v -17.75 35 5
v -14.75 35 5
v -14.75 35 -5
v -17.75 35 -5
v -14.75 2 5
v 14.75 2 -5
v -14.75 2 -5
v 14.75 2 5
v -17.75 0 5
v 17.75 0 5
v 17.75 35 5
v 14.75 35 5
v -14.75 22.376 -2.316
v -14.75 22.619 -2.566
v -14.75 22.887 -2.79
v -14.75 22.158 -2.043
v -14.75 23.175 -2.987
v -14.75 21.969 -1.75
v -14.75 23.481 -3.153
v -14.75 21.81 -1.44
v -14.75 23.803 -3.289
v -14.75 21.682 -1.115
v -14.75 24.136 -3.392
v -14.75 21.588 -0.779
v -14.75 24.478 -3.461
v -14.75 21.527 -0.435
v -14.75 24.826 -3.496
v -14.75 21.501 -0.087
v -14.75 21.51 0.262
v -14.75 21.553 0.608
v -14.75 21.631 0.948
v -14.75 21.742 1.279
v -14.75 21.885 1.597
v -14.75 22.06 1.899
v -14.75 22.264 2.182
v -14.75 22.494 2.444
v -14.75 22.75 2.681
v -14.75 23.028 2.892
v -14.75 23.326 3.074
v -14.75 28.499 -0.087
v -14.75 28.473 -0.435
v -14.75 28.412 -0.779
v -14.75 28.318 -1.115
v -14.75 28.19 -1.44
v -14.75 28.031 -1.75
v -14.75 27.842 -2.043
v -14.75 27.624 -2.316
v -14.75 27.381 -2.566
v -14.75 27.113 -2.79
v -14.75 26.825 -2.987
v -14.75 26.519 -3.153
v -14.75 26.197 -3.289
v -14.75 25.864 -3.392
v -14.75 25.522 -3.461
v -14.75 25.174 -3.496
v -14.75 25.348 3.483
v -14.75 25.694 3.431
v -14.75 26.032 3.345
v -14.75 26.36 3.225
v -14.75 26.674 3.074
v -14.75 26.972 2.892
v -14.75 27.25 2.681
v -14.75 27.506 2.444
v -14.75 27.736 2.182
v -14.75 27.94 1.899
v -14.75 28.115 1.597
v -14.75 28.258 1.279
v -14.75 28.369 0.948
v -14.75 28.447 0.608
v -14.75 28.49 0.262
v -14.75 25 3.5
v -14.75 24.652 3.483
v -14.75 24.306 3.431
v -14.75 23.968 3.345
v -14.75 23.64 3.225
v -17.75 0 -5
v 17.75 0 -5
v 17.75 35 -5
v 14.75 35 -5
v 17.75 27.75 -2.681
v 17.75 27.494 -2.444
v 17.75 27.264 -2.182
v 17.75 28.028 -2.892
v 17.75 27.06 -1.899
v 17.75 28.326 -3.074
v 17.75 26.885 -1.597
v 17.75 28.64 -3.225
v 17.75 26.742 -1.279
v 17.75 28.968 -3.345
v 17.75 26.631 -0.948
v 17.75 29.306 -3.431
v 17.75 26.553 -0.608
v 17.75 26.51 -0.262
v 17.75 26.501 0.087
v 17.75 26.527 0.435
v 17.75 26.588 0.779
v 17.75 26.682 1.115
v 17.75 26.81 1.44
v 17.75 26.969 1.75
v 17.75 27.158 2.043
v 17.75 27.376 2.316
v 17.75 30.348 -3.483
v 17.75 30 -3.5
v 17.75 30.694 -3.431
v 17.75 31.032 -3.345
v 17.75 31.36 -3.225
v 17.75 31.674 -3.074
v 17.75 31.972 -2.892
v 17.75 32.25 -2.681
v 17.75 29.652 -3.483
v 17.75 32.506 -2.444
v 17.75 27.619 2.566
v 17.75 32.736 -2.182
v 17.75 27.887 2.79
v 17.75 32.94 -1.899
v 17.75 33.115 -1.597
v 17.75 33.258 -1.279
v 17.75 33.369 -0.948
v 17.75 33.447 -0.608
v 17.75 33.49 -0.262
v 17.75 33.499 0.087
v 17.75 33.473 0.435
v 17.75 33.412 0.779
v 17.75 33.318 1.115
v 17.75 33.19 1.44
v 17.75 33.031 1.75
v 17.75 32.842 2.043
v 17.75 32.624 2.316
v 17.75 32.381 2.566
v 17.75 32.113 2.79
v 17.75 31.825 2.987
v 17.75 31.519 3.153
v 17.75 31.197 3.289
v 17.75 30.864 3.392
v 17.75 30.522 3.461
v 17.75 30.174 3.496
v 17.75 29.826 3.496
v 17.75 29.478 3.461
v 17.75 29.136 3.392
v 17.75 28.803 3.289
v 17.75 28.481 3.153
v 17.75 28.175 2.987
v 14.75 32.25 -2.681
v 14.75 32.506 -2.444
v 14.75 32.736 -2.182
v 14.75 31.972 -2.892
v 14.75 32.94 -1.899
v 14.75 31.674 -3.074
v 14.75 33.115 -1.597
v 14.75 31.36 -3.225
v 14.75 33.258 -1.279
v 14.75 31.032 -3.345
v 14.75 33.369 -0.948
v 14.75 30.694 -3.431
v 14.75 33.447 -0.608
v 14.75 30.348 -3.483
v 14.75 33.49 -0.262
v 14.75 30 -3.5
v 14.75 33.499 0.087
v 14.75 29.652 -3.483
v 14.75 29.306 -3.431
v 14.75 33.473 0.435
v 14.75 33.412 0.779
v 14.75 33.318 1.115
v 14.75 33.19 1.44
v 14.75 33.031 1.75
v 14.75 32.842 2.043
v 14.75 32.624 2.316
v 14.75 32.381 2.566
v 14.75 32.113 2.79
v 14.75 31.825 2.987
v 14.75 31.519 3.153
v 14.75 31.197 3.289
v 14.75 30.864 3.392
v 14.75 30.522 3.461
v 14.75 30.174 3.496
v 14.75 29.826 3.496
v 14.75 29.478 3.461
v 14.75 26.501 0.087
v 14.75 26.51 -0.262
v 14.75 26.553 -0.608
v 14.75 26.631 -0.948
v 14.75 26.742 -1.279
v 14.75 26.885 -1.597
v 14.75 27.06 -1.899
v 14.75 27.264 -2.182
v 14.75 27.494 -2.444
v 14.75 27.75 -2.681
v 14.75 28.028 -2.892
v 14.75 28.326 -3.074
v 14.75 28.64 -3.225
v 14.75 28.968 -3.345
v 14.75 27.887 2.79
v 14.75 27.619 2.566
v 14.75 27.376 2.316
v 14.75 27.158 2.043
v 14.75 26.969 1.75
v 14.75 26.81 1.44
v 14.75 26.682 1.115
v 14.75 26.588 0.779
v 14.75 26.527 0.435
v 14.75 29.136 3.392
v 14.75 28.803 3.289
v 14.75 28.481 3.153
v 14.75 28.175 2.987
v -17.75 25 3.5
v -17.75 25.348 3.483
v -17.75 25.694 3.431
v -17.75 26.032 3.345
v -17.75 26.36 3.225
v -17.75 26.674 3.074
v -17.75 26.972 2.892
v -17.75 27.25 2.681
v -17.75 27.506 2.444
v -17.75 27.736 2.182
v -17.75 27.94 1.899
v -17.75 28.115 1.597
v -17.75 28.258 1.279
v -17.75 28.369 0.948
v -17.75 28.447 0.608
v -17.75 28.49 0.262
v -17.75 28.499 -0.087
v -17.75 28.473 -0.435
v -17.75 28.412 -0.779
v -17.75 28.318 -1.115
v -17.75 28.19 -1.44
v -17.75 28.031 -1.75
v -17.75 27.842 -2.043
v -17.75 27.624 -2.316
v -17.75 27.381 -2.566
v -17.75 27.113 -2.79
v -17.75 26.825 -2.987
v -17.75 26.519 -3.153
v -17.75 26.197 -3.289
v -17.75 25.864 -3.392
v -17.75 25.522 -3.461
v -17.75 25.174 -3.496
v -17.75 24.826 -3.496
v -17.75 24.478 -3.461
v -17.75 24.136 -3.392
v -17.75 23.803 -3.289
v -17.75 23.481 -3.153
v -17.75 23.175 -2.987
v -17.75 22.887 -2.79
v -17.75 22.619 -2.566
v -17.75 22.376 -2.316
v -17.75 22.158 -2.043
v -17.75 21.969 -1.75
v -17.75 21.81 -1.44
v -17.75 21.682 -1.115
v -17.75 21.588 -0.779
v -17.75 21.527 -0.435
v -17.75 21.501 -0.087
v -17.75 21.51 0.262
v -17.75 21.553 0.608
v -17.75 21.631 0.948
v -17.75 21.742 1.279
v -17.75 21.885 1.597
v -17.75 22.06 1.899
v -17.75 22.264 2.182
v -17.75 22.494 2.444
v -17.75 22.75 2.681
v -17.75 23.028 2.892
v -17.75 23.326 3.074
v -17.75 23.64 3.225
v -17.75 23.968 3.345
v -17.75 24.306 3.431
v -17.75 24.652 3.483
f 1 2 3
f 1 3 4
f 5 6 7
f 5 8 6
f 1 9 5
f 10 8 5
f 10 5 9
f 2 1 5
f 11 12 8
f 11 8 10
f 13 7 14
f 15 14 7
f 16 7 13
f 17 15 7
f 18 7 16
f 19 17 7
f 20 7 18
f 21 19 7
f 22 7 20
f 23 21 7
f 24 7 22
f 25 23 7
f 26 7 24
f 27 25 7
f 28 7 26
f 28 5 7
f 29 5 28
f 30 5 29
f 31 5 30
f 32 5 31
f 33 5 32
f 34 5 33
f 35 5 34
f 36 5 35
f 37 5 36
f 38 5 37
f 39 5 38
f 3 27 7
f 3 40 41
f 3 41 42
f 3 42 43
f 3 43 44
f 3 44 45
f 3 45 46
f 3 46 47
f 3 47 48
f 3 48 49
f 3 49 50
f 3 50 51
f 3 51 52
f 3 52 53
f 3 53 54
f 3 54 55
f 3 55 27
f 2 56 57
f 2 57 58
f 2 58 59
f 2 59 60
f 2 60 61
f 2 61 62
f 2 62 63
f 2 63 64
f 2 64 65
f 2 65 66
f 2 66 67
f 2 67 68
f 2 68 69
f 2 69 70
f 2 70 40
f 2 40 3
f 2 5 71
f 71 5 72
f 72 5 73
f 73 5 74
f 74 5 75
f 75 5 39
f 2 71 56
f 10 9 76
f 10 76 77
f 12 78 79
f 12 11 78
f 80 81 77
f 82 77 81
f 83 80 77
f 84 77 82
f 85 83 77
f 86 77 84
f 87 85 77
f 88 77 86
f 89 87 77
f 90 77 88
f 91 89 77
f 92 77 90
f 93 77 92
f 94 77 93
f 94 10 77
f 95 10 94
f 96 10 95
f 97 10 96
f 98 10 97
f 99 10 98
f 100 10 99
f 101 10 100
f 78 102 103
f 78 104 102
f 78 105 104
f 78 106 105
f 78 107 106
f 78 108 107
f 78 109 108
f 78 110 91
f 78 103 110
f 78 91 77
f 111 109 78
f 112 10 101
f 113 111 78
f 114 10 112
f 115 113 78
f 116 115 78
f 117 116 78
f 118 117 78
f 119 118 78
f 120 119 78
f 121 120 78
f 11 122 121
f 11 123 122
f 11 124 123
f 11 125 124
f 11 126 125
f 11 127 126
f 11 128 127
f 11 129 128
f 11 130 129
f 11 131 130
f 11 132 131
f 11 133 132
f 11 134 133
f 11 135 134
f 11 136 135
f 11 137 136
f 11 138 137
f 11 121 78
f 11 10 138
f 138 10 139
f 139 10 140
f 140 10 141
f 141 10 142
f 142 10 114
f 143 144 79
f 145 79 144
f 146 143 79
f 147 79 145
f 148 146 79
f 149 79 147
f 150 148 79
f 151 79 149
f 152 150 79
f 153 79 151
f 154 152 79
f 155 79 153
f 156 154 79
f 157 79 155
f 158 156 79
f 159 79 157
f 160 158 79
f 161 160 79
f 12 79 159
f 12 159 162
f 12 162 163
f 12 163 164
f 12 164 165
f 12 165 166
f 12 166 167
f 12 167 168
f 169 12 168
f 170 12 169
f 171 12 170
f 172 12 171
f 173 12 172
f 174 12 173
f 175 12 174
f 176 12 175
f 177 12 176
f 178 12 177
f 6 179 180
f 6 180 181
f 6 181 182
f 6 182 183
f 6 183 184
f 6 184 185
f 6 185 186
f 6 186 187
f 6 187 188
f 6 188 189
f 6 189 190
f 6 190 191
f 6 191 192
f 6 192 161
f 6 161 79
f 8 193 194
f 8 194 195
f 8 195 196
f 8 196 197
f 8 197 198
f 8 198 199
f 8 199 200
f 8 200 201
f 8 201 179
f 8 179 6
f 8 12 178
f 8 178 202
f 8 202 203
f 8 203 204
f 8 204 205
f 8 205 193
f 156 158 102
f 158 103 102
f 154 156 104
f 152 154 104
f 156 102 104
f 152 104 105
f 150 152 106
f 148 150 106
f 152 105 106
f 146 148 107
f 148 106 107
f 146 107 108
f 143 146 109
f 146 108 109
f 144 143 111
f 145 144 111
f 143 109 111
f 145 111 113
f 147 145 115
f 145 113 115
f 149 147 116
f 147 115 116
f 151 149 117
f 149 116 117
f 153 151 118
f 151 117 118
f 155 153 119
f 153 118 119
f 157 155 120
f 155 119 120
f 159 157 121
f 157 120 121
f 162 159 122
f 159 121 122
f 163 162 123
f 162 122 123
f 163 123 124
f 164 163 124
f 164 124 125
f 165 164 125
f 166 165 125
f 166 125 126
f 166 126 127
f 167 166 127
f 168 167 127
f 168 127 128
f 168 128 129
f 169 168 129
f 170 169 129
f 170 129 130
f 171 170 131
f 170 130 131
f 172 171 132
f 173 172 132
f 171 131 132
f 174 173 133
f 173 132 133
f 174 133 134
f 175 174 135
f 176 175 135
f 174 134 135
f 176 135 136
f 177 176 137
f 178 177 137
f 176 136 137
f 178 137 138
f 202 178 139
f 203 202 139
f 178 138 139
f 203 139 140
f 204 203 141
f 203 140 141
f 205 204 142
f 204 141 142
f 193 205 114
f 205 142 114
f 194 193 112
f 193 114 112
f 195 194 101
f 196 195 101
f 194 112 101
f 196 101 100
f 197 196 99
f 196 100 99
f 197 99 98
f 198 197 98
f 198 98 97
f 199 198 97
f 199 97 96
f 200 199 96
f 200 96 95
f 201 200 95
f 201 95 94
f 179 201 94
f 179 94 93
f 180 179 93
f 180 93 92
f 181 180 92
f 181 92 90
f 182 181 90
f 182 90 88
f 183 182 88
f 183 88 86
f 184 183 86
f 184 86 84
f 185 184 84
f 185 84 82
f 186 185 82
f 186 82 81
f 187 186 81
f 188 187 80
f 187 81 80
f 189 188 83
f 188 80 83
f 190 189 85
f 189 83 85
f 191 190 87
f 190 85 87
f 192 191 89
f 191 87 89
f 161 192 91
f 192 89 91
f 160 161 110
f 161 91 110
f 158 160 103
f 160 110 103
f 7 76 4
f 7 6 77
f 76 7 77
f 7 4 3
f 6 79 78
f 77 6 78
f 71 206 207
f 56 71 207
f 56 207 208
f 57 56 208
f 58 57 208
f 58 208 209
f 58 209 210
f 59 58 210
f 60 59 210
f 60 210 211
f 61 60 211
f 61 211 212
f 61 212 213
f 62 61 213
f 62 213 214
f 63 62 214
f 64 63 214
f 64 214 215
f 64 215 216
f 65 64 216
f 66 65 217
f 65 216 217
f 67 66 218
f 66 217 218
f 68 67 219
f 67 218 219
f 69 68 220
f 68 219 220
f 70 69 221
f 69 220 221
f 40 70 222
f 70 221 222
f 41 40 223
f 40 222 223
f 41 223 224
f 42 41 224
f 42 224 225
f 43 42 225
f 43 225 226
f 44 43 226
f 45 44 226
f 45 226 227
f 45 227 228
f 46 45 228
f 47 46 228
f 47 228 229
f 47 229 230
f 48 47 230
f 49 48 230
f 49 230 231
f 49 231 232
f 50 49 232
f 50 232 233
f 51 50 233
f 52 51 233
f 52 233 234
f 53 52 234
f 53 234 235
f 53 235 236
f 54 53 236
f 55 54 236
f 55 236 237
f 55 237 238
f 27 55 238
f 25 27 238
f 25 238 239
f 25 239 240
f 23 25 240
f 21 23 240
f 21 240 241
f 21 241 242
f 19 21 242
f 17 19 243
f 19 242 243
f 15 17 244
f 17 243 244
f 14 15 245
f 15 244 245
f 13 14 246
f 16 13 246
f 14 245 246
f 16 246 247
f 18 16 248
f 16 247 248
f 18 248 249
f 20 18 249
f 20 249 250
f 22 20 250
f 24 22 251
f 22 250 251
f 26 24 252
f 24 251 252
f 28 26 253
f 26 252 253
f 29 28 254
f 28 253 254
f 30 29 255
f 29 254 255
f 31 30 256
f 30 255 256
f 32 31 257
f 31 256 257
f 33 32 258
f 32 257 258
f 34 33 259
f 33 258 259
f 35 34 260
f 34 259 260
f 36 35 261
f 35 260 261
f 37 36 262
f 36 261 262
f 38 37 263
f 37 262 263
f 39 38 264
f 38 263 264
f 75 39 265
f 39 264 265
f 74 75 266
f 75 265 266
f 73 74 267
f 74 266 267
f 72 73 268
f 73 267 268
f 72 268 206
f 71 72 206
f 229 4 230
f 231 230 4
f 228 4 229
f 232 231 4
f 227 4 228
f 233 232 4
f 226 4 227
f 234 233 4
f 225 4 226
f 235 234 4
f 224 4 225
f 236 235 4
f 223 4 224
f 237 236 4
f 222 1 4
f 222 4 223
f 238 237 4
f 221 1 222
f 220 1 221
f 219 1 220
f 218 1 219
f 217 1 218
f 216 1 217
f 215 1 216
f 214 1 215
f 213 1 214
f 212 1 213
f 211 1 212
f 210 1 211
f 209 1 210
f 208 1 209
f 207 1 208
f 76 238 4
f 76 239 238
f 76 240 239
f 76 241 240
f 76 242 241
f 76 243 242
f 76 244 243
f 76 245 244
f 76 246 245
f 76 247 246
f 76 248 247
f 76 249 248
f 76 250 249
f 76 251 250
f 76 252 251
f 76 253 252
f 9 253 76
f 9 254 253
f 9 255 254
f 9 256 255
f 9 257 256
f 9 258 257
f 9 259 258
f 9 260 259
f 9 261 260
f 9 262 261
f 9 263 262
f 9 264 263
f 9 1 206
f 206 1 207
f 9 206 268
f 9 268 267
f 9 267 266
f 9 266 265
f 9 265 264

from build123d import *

# Parameters (mm, degrees)
BOSS_EXTRUDE1_DEPTH = 5
SKETCH2_R           = 3.5
CUT_EXTRUDE1_DEPTH  = 5
CUT_EXTRUDE2_REACH  = 52.102
SKETCH3_R           = 3.5


with BuildPart() as part:
    # Sketch1 → Boss-Extrude1 (new, symmetric)
    with BuildSketch(Plane.XY):
        Polygon((14.75, 2), (-14.75, 2), (-14.75, 35), (-17.75, 35), (-17.75, 0), (17.75, 0), (17.75, 35), (14.75, 35), align=None)
    extrude(amount=BOSS_EXTRUDE1_DEPTH, both=True)

    # Sketch2 → Cut-Extrude1 (cut, symmetric)
    with BuildSketch(Plane(origin=(17.75, 0, 0), x_dir=(0, 0, -1), z_dir=(1, 0, 0))):
        with Locations((0, 30)):
            Circle(SKETCH2_R)
    extrude(amount=CUT_EXTRUDE1_DEPTH, both=True, mode=Mode.SUBTRACT)

    # Sketch3 → Cut-Extrude2 (cut, up to next)
    with BuildSketch(Plane.ZY.offset(17.75), mode=Mode.PRIVATE) as cut_extrude2_sk1:
        with Locations((0, 25)):
            Circle(SKETCH3_R)
    cut_extrude2_tool1 = extrude(cut_extrude2_sk1.sketch, amount=-CUT_EXTRUDE2_REACH, mode=Mode.PRIVATE) & part.part
    add(cut_extrude2_tool1.solids().sort_by_distance((-17.75, 25, 0))[0], mode=Mode.SUBTRACT)


solid = part.part
